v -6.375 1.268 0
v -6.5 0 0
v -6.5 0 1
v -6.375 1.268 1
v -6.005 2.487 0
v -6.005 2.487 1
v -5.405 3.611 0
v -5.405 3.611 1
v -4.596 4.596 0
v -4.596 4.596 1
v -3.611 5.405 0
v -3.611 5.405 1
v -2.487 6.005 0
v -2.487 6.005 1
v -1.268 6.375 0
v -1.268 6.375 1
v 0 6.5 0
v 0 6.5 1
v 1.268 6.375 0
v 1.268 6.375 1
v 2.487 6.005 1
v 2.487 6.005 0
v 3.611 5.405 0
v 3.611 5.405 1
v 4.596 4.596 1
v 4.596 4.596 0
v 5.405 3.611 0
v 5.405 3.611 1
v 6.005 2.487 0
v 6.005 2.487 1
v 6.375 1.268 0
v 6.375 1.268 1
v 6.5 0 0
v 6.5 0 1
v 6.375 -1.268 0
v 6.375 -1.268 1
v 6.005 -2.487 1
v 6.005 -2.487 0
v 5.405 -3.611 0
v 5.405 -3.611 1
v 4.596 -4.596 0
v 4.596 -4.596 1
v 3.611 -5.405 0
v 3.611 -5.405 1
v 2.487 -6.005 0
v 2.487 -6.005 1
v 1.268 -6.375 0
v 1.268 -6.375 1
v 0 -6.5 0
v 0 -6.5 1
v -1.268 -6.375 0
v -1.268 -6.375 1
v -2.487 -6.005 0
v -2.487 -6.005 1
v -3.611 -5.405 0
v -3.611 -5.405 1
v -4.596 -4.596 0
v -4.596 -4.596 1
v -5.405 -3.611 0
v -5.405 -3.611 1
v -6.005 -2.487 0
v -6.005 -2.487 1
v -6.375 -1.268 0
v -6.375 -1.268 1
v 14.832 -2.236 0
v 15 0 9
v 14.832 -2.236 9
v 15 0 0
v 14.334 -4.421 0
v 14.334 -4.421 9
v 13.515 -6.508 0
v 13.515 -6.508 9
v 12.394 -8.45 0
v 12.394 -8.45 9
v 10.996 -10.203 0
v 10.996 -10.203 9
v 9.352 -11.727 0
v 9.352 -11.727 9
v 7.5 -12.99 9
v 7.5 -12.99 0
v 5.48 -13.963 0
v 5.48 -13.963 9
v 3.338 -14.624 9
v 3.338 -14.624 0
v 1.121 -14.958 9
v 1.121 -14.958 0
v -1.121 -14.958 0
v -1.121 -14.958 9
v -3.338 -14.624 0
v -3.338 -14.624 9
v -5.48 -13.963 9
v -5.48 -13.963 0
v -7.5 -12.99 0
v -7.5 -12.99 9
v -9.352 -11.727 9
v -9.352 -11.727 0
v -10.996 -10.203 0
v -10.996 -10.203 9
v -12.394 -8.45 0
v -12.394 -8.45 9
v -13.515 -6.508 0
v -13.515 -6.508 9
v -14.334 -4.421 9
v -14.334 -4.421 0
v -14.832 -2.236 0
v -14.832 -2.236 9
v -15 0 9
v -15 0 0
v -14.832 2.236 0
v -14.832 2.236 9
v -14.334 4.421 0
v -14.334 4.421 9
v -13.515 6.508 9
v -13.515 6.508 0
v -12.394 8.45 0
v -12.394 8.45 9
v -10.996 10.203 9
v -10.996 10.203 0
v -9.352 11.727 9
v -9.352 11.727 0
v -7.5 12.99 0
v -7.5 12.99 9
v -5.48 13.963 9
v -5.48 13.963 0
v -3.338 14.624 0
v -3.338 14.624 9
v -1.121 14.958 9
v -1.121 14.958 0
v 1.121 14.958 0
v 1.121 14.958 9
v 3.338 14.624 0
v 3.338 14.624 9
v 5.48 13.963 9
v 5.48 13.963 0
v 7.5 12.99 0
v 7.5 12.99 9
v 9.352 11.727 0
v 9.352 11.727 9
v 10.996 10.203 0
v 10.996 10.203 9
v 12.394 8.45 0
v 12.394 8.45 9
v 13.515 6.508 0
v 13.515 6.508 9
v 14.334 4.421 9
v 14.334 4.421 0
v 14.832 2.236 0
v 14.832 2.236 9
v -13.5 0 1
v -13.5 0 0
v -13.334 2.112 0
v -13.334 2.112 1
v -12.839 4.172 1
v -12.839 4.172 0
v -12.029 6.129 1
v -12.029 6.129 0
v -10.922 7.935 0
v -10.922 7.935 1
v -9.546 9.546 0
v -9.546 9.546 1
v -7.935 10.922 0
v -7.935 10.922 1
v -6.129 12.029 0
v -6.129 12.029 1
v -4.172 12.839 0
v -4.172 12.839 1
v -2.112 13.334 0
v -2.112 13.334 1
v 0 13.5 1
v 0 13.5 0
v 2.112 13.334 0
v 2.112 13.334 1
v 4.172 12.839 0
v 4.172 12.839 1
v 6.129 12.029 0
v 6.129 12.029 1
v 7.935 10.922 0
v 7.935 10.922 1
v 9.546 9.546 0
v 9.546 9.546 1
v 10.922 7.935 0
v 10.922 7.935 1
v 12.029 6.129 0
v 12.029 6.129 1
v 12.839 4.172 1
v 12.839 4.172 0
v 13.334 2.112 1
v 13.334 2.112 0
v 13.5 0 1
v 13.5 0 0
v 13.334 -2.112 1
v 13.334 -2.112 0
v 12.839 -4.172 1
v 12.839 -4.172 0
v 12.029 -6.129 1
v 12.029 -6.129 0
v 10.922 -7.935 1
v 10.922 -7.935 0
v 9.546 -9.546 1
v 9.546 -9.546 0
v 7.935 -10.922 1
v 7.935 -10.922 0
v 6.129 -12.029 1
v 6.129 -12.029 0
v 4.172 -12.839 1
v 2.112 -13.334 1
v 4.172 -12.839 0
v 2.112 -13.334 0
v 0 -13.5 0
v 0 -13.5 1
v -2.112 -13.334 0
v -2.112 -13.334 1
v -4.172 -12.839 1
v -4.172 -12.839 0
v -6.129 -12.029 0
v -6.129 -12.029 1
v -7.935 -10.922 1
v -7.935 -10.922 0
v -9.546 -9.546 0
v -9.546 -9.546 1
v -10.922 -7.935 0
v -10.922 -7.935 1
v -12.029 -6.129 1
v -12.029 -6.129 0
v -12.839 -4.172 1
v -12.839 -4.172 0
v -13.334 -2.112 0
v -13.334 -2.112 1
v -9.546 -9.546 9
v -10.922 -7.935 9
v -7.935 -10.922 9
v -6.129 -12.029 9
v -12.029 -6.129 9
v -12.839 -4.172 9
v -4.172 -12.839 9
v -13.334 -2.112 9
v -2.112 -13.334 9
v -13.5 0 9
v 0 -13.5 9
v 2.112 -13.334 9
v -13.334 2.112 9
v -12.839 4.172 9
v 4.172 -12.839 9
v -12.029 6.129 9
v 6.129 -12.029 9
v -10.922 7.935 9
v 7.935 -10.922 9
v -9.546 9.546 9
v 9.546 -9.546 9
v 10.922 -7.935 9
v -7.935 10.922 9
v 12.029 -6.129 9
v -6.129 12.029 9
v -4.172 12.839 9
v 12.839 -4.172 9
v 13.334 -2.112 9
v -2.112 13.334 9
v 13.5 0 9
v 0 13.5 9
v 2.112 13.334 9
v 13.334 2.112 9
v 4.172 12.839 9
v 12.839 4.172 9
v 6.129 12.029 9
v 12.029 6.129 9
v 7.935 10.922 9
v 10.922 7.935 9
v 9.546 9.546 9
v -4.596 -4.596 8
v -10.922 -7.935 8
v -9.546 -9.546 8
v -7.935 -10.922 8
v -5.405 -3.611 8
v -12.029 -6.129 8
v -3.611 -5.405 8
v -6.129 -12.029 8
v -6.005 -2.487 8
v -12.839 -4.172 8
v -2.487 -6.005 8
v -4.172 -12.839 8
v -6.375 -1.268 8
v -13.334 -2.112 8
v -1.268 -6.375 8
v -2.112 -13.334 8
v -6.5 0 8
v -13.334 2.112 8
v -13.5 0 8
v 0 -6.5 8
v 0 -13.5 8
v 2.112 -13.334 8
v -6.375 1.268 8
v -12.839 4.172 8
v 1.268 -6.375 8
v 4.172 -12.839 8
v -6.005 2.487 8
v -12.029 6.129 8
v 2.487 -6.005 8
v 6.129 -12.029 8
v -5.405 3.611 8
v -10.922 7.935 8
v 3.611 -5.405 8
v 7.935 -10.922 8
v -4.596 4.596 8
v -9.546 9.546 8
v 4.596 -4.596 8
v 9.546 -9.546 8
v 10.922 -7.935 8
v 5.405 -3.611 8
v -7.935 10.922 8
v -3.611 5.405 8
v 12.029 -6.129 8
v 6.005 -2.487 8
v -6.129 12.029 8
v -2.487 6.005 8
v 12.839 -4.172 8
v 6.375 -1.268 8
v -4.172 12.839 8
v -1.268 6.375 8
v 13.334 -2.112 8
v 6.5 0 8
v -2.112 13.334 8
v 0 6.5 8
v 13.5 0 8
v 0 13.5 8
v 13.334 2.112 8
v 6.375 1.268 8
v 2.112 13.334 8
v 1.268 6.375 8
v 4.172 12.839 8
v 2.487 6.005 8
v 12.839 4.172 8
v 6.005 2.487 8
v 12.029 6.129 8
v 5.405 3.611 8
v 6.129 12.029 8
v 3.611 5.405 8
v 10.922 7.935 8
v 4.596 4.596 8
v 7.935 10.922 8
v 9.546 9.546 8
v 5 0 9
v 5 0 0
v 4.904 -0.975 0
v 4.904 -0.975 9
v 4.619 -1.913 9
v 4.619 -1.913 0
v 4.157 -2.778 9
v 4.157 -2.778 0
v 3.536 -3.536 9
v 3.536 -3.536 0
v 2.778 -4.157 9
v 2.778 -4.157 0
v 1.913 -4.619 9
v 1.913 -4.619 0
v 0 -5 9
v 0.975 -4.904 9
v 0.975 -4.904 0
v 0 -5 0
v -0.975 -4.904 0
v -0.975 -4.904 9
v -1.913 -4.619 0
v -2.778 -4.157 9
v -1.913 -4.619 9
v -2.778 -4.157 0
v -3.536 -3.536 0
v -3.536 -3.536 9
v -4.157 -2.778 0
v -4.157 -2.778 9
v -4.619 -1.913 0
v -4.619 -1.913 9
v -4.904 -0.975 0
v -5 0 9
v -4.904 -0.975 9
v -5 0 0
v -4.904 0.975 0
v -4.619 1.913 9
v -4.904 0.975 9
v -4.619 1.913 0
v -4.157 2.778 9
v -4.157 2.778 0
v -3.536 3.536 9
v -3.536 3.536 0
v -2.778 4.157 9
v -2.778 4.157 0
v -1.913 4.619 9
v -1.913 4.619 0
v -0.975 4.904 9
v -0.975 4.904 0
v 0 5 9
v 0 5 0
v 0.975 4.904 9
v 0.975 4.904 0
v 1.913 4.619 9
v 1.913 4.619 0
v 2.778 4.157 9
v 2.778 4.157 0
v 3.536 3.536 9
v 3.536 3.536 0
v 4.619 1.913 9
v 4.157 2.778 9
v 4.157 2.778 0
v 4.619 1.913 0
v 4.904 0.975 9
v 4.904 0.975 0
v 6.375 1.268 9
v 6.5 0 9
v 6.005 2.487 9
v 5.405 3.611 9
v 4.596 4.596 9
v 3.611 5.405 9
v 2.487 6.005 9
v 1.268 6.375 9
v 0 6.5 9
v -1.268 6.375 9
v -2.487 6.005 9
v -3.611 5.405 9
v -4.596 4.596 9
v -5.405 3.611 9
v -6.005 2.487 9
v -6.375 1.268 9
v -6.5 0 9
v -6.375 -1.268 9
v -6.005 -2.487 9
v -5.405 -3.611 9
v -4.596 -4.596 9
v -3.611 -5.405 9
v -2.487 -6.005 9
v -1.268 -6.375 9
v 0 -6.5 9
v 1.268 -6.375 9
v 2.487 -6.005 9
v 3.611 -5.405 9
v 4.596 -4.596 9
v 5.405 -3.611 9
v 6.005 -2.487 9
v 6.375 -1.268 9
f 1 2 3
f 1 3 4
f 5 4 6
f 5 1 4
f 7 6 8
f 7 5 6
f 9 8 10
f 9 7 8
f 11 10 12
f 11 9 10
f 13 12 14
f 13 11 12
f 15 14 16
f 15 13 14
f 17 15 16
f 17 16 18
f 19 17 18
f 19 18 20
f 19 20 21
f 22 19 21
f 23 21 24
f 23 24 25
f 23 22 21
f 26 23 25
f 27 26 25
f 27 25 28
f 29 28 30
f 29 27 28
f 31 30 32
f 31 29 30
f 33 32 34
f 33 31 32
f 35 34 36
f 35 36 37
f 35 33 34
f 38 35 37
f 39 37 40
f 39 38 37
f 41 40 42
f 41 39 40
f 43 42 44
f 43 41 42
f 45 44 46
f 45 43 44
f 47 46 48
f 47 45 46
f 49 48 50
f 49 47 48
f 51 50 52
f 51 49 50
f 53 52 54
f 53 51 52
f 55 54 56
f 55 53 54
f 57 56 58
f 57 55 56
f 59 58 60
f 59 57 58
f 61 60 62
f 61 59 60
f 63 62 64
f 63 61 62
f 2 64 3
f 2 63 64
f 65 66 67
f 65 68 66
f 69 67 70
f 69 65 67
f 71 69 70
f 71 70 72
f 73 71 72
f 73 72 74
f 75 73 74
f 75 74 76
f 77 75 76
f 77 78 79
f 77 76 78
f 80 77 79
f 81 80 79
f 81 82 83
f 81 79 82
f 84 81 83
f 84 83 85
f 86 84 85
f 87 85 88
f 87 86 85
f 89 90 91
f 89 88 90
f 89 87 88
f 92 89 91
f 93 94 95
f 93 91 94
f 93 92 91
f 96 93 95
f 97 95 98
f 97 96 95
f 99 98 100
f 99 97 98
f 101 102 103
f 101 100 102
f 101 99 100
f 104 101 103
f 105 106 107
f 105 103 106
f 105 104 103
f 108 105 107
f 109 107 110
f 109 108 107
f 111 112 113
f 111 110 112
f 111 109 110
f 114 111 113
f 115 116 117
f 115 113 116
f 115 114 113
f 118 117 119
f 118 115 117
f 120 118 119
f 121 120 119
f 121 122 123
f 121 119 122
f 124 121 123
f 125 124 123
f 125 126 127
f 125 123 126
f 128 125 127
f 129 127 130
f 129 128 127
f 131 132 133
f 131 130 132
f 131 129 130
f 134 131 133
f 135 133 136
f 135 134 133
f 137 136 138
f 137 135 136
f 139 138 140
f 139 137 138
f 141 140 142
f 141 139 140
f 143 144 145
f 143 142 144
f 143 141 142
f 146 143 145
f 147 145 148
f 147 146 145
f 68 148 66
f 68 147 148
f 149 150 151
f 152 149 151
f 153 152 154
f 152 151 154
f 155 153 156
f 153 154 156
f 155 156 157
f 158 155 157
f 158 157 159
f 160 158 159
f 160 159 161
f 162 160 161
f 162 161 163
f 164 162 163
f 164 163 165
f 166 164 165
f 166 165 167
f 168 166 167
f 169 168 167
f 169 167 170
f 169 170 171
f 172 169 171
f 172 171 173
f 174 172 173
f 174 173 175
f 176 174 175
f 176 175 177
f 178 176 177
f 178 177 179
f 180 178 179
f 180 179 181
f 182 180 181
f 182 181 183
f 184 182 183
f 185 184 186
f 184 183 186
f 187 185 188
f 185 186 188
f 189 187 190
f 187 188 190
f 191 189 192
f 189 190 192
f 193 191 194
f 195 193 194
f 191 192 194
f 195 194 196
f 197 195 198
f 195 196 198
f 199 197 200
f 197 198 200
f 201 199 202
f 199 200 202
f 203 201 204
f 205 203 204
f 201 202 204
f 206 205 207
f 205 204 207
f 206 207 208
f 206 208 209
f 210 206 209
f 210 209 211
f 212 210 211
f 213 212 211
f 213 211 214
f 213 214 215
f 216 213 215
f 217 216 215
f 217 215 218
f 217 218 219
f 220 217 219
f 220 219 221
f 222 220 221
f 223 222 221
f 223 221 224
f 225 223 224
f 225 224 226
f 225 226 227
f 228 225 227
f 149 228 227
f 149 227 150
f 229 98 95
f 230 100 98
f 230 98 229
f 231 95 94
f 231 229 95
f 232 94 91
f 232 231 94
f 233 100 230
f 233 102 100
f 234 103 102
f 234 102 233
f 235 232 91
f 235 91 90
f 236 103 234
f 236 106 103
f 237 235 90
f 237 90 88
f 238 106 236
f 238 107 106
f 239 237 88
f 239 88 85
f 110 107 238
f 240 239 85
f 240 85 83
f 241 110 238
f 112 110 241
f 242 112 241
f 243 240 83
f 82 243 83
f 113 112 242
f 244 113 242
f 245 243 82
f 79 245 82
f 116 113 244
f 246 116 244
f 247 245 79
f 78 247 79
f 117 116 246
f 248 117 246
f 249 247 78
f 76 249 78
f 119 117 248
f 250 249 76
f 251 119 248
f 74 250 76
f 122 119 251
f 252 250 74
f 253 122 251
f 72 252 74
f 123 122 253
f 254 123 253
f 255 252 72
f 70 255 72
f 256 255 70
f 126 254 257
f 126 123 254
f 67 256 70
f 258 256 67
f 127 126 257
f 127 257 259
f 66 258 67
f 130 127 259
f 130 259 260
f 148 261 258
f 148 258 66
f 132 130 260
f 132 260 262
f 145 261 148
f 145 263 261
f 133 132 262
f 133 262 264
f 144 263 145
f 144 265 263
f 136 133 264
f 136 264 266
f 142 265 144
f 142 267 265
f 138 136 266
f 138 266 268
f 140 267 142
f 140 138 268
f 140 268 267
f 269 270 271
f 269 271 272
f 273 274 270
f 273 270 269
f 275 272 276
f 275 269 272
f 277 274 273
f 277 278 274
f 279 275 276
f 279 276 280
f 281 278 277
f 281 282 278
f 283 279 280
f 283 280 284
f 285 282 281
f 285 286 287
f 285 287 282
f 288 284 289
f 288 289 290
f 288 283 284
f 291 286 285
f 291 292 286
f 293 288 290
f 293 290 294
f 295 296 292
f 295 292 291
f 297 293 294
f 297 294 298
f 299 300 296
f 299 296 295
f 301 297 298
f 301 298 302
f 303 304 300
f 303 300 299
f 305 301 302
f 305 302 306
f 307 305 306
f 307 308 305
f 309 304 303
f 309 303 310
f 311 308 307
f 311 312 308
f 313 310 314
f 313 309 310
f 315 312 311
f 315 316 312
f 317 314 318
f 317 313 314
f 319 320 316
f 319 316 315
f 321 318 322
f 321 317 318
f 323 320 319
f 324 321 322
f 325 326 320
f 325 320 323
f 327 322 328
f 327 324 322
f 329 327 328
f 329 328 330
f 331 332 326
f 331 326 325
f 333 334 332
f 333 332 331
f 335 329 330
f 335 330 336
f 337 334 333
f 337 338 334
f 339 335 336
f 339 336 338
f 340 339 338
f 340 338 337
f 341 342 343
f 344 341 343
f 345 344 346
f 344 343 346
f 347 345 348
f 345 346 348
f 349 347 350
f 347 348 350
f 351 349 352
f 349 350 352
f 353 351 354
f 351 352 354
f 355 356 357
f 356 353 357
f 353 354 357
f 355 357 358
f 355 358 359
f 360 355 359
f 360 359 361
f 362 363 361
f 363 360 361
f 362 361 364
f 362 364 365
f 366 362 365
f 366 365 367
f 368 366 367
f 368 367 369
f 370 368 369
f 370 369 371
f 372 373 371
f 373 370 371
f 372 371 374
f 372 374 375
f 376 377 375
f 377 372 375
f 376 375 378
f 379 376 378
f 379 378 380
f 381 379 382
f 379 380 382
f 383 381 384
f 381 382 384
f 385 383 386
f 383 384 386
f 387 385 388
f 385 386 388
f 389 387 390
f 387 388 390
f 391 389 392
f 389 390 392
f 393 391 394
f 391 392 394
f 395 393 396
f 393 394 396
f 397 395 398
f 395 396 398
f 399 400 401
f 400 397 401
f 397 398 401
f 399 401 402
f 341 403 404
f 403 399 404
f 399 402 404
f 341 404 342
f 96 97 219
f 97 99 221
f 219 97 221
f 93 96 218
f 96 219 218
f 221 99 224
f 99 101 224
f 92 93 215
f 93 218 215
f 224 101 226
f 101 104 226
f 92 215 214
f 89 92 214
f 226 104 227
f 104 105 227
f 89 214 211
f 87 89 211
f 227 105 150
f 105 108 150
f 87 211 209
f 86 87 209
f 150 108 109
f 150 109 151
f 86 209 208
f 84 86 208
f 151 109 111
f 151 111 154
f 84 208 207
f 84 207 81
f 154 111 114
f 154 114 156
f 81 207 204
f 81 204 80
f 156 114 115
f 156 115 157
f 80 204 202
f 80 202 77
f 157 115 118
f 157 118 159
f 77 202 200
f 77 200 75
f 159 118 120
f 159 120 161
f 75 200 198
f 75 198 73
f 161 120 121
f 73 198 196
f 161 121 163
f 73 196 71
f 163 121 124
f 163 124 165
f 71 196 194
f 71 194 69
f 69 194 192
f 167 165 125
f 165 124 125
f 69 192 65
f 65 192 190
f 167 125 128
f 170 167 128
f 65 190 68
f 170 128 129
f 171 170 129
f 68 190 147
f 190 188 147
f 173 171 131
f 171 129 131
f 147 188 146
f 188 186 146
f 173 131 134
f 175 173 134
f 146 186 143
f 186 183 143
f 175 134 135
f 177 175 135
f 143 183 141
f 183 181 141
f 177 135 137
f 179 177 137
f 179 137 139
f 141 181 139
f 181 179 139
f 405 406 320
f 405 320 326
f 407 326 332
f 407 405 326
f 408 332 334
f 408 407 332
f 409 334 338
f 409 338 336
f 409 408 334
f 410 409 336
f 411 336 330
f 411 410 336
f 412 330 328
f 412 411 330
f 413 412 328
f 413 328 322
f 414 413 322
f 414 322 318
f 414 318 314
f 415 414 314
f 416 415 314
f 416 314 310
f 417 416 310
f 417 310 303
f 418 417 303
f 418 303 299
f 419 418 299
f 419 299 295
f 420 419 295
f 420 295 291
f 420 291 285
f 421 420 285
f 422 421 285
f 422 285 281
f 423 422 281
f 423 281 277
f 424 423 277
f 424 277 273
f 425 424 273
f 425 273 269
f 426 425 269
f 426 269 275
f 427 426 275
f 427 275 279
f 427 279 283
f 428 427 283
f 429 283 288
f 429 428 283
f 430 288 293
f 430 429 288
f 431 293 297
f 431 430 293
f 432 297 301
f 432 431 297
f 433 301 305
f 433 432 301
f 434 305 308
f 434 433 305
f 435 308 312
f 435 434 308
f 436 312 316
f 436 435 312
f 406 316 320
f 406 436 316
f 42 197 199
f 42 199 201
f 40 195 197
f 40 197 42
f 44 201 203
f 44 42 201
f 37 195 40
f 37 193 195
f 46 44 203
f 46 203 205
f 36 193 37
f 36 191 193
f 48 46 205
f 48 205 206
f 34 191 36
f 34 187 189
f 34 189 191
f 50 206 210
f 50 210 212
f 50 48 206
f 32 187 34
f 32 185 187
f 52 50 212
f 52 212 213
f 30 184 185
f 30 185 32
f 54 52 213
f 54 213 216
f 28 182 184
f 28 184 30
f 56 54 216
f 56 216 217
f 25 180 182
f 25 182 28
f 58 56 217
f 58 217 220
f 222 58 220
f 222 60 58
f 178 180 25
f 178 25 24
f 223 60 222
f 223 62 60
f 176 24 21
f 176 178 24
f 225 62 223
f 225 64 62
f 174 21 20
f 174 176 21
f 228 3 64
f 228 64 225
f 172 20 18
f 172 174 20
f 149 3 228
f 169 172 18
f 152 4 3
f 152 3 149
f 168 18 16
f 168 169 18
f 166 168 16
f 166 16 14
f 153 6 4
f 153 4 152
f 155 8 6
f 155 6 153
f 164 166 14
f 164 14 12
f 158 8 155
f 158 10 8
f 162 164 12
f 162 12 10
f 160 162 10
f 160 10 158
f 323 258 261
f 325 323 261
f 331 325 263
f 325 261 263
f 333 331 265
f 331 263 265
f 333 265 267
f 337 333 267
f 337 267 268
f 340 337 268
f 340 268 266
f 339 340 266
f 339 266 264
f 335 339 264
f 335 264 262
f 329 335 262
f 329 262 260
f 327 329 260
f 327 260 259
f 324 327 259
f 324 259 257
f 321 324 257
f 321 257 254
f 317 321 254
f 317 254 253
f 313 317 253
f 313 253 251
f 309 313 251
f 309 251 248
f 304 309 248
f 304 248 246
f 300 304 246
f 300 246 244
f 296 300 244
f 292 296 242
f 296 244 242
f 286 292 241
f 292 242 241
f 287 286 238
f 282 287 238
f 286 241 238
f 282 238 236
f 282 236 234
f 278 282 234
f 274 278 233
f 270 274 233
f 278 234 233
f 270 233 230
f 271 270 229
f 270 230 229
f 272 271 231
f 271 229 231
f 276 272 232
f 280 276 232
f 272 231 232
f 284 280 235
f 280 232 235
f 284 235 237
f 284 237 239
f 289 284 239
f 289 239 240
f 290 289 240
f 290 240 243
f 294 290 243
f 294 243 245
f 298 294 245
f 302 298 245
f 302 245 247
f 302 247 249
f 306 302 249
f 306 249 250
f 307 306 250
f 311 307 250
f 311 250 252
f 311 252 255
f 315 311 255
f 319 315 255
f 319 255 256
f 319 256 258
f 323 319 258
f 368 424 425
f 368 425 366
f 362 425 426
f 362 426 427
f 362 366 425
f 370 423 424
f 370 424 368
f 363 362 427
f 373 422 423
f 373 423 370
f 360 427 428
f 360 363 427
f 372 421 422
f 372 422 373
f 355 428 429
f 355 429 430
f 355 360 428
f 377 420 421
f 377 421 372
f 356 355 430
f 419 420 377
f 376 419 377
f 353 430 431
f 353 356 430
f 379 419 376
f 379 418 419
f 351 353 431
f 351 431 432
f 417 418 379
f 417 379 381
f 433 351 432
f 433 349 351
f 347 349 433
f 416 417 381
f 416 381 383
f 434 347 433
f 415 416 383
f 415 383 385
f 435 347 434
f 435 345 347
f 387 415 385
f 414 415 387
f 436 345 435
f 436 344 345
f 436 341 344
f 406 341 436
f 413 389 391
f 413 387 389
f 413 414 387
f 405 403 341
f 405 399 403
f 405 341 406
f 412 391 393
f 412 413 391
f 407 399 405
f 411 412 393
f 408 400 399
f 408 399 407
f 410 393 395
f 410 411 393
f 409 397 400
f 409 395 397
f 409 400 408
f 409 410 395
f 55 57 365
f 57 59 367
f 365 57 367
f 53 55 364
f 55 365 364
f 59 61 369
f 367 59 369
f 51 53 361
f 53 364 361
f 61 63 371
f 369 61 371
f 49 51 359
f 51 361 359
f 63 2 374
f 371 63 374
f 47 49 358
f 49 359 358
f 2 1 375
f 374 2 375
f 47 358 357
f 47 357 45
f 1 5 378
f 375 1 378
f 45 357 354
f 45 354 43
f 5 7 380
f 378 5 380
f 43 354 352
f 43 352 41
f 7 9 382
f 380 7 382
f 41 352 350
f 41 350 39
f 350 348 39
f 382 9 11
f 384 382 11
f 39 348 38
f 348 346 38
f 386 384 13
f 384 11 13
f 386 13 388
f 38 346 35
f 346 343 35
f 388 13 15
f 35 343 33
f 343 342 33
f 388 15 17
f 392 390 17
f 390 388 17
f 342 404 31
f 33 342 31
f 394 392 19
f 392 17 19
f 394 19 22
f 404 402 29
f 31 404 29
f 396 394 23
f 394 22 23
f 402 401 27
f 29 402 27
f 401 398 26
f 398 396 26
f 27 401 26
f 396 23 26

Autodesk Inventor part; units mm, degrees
ref_plane "YZ Plane" through (0, 0, 0) normal (1, 0, 0) x (0, 1, 0)
ref_plane "XZ Plane" through (0, 0, 0) normal (0, 1, 0) x (-1, 0, 0)
ref_plane "XY Plane" through (0, 0, 0) normal (0, 0, 1) x (1, 0, 0)
sketch "Szkic1" plane through (0, 0, 0) normal (0, 0, 1) x (1, 0, 0)
  circle A0 centre (0, 0) radius 5
  circle A1 centre (0, 0) radius 15
  dimension "d0" = 10
  dimension "d1" = 30
extrude "Wyciągnięcie proste1" add sketch "Szkic1" along normal blind 9
sketch "Szkic2" plane through (0, 0, 9) normal (0, 0, 1) x (1, 0, 0)
  circle A0 centre (0, 0) radius 5 projected
  circle A1 centre (0, 0) radius 15 projected
  circle A2 centre (0, 0) radius 6.5
  circle A3 centre (0, 0) radius 13.5
  dimension "d4" = 13
  dimension "d5" = 27
extrude "Wyciągnięcie proste2" cut sketch "Szkic2" against normal blind 1 contours A3
sketch "Szkic3" plane through (0, 0, 0) normal (0, 0, -1) x (-1, 0, 0)
  circle A0 centre (0, 0) radius 6.5
  circle A1 centre (0, 0) radius 13.5
  dimension "d8" = 13
  dimension "d9" = 27
extrude "Wyciągnięcie proste3" cut sketch "Szkic3" against normal blind 1
properties part number "Łożysko kulowe jednorzędowe 6200 2RS"
